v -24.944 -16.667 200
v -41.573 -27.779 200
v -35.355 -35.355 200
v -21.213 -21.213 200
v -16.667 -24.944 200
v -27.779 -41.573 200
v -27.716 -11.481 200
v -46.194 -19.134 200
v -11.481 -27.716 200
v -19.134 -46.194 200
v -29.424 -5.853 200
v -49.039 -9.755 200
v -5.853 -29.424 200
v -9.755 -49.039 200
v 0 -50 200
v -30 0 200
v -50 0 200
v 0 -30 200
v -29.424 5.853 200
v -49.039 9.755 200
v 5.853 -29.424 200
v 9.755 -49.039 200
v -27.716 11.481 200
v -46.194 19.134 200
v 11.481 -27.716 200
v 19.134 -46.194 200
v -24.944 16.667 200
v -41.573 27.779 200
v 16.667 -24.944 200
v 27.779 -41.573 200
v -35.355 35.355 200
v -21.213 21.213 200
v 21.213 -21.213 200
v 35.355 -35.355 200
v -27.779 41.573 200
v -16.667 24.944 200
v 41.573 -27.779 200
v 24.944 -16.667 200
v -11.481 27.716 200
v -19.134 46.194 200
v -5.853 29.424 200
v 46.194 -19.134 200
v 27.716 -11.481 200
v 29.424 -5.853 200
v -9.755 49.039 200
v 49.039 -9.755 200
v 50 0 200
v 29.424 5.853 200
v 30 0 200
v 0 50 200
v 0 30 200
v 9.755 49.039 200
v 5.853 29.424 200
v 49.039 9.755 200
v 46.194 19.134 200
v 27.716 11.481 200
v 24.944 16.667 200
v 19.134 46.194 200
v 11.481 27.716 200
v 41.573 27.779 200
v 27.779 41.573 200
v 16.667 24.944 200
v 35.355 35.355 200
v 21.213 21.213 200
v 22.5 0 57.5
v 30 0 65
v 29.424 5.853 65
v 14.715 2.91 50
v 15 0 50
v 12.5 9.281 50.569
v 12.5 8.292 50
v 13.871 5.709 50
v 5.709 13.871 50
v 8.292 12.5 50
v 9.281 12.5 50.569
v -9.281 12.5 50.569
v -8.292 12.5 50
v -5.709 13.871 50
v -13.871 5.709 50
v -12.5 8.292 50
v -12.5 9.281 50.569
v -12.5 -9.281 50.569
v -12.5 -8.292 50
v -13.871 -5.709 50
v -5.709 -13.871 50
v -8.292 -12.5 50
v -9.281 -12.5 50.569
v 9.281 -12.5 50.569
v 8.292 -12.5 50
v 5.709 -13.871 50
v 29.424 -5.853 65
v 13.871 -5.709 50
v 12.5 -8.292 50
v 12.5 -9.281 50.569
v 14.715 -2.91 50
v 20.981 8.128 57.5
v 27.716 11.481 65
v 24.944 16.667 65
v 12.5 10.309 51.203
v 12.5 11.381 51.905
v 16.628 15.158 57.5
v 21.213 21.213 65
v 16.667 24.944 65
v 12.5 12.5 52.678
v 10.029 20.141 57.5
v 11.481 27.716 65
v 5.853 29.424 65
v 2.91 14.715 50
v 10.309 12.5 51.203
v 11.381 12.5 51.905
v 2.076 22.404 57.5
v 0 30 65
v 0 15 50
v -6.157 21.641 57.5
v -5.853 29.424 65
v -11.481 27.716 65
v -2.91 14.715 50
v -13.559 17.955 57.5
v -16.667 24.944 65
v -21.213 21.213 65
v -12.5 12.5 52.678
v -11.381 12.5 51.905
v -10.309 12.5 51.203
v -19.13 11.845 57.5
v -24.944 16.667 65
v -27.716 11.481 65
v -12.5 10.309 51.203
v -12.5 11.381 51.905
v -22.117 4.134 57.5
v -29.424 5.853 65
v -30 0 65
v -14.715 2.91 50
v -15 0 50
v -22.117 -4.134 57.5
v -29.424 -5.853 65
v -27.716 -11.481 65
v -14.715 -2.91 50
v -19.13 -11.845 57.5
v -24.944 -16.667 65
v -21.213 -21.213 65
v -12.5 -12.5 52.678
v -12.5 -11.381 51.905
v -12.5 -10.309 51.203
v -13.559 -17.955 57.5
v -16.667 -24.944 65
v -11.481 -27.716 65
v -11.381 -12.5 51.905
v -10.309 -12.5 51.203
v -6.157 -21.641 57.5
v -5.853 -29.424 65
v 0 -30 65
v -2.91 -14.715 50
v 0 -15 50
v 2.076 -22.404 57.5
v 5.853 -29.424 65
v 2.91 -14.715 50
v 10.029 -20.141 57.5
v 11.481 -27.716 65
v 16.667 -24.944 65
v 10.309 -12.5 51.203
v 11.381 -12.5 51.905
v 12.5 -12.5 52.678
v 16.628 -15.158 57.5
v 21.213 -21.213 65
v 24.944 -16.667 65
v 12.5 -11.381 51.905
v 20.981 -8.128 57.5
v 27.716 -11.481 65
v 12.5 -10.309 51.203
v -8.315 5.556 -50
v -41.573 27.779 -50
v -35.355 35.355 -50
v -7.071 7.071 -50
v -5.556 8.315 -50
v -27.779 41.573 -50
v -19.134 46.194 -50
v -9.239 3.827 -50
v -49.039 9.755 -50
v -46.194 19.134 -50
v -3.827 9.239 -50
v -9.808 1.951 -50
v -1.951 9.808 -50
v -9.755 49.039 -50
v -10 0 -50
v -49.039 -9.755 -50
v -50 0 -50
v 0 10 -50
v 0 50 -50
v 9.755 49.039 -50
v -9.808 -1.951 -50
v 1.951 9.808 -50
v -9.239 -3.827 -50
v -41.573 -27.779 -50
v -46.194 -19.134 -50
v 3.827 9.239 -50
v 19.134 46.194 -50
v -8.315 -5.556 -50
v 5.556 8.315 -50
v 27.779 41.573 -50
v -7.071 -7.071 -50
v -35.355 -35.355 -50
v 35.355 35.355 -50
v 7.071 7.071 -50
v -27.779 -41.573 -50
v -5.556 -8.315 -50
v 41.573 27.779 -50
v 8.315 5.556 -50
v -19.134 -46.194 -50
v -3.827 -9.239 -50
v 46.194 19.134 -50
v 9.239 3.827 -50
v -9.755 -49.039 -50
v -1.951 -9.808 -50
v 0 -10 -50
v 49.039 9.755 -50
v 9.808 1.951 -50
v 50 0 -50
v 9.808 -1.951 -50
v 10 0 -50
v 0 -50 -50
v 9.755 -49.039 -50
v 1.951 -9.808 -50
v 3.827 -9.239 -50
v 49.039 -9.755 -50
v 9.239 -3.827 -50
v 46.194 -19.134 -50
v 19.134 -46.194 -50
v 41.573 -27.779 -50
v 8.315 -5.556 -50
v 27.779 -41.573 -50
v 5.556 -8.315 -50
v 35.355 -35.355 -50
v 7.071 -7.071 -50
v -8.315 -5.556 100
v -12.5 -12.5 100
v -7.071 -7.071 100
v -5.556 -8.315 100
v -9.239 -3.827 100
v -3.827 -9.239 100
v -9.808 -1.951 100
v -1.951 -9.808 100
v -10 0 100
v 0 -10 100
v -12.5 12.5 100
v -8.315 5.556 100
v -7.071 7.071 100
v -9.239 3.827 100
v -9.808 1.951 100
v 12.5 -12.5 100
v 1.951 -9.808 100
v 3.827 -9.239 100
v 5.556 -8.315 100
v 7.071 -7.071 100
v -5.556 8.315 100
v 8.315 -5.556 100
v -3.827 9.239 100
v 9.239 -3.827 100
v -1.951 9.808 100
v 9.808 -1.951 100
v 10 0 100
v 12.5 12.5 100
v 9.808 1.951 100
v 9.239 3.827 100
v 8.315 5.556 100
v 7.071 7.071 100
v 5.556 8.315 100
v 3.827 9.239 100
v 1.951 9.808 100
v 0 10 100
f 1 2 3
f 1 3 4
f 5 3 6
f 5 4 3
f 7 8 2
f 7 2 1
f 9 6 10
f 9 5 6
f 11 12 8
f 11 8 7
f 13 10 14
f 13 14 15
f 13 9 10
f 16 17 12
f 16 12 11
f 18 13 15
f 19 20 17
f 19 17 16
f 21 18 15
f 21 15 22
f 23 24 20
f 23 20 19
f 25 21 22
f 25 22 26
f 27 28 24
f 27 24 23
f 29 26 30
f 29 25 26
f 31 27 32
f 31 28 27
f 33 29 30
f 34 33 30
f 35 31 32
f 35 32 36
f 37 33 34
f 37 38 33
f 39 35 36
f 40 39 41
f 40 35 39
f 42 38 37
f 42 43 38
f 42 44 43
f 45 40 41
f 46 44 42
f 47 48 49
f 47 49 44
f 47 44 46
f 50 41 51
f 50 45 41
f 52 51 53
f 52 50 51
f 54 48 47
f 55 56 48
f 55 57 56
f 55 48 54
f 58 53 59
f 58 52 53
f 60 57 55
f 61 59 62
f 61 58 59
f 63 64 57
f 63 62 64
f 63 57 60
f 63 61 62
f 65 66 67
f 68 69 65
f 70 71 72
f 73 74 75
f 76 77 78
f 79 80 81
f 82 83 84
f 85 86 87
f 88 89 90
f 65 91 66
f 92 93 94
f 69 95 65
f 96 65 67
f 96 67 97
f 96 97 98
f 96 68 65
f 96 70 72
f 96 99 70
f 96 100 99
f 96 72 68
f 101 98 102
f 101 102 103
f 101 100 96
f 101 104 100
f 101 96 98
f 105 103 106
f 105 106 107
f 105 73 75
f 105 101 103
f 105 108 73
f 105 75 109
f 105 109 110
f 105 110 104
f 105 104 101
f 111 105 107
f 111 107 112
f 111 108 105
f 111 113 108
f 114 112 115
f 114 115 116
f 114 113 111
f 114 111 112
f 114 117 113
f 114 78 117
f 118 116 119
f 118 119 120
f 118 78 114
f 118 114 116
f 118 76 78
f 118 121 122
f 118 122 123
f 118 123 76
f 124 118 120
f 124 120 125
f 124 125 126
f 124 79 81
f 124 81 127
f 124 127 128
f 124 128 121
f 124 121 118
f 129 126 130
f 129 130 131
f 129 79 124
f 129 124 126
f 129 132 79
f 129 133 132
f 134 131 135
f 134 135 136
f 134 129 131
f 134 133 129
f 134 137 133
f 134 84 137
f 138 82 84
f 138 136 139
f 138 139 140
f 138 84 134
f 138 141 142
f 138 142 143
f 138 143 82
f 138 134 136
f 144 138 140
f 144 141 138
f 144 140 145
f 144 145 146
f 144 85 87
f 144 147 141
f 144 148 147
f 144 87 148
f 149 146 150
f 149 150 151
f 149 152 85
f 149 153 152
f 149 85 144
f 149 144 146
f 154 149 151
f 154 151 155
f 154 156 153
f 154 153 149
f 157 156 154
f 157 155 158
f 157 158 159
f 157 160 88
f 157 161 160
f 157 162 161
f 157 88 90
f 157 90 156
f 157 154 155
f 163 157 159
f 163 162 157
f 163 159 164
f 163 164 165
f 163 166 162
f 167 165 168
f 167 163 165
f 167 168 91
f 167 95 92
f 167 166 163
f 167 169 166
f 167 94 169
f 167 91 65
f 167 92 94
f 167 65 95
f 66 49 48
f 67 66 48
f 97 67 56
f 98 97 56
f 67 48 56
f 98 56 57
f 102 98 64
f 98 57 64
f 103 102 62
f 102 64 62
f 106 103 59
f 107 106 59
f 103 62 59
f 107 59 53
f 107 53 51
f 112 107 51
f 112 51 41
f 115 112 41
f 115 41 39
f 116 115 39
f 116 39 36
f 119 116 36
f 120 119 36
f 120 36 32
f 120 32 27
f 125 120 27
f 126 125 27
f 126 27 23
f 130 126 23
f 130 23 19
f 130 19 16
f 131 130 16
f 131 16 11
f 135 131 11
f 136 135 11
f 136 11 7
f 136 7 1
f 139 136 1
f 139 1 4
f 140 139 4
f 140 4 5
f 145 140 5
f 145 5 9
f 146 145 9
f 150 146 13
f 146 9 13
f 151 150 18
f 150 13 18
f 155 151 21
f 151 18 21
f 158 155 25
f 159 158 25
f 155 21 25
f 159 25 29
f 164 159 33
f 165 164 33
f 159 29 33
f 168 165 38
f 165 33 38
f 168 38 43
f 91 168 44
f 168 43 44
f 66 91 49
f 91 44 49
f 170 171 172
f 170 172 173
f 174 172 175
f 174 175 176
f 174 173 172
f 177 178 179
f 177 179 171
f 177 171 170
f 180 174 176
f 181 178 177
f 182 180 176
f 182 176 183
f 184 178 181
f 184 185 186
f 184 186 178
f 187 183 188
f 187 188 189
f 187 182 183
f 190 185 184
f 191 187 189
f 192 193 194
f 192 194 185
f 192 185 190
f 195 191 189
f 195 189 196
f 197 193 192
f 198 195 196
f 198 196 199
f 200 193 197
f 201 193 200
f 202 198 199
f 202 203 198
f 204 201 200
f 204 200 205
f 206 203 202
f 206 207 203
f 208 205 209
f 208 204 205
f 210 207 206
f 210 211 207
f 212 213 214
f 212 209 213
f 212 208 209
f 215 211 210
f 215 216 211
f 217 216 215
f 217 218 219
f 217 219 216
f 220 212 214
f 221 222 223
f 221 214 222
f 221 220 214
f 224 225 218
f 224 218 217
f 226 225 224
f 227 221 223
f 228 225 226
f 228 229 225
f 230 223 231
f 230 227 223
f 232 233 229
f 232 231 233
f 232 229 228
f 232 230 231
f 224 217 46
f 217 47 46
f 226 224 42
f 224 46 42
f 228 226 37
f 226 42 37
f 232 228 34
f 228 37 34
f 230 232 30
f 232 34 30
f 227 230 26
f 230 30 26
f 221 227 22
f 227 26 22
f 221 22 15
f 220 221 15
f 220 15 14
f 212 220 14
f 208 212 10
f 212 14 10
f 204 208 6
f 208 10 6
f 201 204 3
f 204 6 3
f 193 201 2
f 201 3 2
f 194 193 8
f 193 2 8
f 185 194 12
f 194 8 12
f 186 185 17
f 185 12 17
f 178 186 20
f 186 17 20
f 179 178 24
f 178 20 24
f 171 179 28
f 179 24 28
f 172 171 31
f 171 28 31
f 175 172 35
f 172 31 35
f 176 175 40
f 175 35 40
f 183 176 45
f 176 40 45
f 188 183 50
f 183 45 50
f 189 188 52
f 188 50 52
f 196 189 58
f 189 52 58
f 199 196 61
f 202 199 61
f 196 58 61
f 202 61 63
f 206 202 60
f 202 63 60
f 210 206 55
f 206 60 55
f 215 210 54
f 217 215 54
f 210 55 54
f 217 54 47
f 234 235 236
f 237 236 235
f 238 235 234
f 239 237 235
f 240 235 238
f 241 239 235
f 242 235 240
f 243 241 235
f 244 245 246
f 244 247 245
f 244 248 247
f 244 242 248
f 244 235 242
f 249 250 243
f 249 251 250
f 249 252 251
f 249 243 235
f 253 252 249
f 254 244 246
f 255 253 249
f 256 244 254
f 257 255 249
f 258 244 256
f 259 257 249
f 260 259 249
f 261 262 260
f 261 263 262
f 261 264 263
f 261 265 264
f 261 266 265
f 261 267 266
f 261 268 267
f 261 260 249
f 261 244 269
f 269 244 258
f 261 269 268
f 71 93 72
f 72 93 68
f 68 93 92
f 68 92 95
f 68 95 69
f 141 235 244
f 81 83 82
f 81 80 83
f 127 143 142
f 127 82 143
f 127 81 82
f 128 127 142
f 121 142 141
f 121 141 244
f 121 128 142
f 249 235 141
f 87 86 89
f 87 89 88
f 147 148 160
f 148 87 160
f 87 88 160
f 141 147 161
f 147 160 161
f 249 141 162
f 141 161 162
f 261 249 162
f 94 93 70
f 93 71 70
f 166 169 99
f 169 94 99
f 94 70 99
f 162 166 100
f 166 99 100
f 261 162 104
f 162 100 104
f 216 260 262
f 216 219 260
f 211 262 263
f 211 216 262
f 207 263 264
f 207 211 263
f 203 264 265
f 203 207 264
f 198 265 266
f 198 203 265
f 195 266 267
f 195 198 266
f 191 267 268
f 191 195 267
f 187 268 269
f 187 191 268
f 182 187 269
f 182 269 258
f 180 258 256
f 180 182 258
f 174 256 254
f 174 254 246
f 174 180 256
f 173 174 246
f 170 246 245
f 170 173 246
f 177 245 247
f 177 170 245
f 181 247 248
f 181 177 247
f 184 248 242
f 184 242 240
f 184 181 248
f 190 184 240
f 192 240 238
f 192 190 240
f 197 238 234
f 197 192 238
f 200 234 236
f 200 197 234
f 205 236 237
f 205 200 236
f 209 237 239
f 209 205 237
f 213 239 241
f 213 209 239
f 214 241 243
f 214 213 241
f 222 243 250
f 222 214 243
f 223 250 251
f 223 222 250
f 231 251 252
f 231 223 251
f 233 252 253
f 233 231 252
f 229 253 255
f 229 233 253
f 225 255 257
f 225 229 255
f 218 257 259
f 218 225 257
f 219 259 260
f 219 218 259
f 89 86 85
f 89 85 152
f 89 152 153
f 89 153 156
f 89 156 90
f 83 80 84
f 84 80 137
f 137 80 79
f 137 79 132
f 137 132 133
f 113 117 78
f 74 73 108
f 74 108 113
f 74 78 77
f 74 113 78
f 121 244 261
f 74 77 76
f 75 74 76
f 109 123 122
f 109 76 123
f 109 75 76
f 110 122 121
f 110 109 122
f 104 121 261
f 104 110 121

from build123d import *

# Parameters (mm, degrees)
F0_R       = 50
F1_DEPTH   = 200
F2_R       = 30
F3_DEPTH   = 150
F1_FACE1_R = 50
F4_R       = 10
F5_DEPTH   = 50
F6_R       = 10
F7_DEPTH   = 150
F8_W       = 25
F8_H       = 25
F8_R       = 10
F9_DEPTH   = 50


# Not quite as in the source:
# - a fillet or chamfer that OpenCascade refuses, or shapes differently, is made with other operations: its cross-section is extruded or revolved along the edge and cut away or added


with BuildPart() as f1:
    # F0 (on Top) → F1 (new body)
    with BuildSketch(Plane.XY):
        Circle(F0_R)
    extrude(amount=F1_DEPTH)

    # F2 (on face) → F3 (cut)
    with BuildSketch(Plane.XY.offset(200)):
        Circle(F2_R)
    extrude(amount=-F3_DEPTH, mode=Mode.SUBTRACT)

    # F1_face1 (on face) + F4 (on face) → F5 (join)
    with BuildSketch(Plane(origin=(0, 0, 0), x_dir=(1, 0, 0), z_dir=(0, 0, -1))):
        Circle(F1_FACE1_R)
    with BuildSketch(Plane(origin=(0, 0, 0), x_dir=(1, 0, 0), z_dir=(0, 0, -1))):
        Circle(F4_R)
    extrude(amount=F5_DEPTH)

    # F6 (on face) → F7 (cut)
    with BuildSketch(Plane(origin=(0, 0, -50), x_dir=(1, 0, 0), z_dir=(0, 0, -1))):
        Circle(F6_R)
    extrude(amount=-F7_DEPTH, mode=Mode.SUBTRACT)

    # F8 (on face) → F9 (join)
    with BuildSketch(Plane.XY.offset(50)):
        Rectangle(F8_W, F8_H)
        Circle(F8_R, mode=Mode.SUBTRACT)
    extrude(amount=F9_DEPTH)

    # F10: chamfer of 15 on 1 edges, made by hand

    # F10_s1 → F10_t2 (revolve)
    with BuildSketch(Plane.XZ):
        Polygon((30, 65), (15, 50), (30, 50), align=None)
    revolve(axis=Axis((0, 0, 50), (0, 0, 1)))


solid = f1.part
